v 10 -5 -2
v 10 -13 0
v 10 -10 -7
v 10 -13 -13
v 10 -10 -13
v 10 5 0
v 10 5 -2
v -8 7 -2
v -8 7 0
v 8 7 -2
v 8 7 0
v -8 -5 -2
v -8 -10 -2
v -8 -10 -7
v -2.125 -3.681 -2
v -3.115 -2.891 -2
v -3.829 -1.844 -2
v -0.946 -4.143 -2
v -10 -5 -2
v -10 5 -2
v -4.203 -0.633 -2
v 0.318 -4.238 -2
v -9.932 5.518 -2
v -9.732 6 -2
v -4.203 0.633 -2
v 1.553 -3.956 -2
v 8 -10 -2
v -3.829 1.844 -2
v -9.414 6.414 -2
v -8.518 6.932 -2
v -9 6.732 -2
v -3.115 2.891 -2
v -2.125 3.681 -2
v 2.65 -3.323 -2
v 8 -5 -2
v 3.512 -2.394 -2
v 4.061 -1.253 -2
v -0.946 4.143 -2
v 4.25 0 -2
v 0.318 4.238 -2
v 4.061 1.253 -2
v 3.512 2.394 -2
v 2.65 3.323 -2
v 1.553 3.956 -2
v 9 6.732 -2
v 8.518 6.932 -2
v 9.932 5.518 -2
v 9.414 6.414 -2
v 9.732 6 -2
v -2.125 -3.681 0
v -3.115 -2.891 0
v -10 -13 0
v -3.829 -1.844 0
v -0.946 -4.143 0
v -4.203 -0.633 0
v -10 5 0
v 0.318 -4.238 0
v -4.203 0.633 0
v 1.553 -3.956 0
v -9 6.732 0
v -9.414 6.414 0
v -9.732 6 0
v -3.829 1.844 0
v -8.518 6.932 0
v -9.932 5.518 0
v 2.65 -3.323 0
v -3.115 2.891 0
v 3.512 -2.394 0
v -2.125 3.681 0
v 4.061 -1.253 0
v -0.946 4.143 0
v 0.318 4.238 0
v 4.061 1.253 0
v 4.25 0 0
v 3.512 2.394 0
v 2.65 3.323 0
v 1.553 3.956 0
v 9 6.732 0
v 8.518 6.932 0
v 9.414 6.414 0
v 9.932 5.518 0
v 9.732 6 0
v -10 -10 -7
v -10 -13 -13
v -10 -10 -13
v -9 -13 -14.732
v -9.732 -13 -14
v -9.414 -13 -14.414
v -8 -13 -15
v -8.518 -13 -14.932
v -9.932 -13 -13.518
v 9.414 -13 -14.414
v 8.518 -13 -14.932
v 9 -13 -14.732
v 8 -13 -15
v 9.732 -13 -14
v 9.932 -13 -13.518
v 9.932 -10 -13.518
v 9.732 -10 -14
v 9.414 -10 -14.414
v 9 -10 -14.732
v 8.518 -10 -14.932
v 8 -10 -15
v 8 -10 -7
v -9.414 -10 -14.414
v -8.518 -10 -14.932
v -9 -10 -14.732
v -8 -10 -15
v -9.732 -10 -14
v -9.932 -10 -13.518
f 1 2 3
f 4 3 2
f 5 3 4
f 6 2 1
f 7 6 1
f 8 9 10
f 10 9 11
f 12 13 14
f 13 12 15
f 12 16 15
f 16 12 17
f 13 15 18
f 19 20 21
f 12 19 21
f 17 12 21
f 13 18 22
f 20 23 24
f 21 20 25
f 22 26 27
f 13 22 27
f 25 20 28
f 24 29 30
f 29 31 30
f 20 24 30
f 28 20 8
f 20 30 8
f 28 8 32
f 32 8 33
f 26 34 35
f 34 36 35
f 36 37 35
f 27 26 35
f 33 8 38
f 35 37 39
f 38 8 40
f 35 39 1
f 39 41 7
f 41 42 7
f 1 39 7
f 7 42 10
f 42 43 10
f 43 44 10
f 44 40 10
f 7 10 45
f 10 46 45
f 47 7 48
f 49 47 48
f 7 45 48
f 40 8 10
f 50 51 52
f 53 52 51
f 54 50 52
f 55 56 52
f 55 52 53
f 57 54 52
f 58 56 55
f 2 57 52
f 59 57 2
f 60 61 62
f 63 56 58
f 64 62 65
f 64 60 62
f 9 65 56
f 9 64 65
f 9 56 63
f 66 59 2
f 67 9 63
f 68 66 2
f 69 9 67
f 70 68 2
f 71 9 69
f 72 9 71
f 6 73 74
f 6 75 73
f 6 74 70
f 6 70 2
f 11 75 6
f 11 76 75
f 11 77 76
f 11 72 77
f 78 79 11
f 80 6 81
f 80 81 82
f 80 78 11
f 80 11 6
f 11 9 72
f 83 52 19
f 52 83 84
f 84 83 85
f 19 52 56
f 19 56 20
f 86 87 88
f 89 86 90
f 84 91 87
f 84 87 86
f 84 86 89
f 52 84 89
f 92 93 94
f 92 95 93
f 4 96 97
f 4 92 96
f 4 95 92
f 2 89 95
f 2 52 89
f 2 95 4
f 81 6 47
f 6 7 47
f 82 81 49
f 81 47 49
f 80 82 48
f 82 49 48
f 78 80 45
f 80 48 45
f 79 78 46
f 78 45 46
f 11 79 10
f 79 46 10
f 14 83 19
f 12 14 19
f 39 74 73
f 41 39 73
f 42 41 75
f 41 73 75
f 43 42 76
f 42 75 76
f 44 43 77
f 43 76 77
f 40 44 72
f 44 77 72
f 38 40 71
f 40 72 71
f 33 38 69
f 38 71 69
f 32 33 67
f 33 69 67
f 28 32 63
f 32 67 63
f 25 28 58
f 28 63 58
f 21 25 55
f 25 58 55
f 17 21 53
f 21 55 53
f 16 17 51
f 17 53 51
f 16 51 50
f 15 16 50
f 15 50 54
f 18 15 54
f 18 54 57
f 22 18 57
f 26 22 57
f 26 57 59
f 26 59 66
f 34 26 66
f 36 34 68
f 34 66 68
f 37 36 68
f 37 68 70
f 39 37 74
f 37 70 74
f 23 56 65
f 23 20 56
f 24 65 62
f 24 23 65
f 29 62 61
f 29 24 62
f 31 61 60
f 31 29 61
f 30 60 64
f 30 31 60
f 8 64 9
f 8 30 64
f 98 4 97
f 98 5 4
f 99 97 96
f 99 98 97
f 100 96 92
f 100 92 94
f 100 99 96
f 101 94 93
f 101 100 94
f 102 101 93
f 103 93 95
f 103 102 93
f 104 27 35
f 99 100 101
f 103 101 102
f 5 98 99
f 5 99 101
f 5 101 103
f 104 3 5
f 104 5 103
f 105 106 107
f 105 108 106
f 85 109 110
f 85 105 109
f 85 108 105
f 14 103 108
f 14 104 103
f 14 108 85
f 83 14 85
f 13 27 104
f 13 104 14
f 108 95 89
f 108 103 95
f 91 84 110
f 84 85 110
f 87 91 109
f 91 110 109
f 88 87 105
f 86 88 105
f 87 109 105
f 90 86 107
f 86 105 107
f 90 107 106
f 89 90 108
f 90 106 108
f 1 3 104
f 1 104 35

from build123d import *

# Parameters (mm, degrees)
SKICA1_W                = 20
SKICA1_H                = 20
SKICA1_R                = 4.25
P_IDAT_VYSUNUT_M1_DEPTH = 2
P_IDAT_START            = -2
SKICA2_W                = 20
SKICA2_H                = 3
P_IDAT_VYSUNUT_M2_DEPTH = 15
P_IDAT_VYSUNUT_M3_DEPTH = 2
ZAOBLIT1_R              = 2
ZAOBLIT2_R              = 2


with BuildPart() as part:
    # Skica1 → Přidat vysunutím1 (new body)
    with BuildSketch(Plane.XY):
        with Locations((0, -3)):
            Rectangle(SKICA1_W, SKICA1_H)
        Circle(SKICA1_R, mode=Mode.SUBTRACT)
    extrude(amount=-P_IDAT_VYSUNUT_M1_DEPTH)

    # Skica2 → Přidat vysunutím2 (add)
    with BuildSketch(Plane(origin=(0, 0, -2), x_dir=(-1, 0, 0), z_dir=(0, 0, -1)).offset(P_IDAT_START)):
        with Locations((0, -11.5)):
            Rectangle(SKICA2_W, SKICA2_H)
    extrude(amount=P_IDAT_VYSUNUT_M2_DEPTH)

    # Skica3 → Přidat vysunutím3 (add)
    with BuildSketch(Plane.ZY.offset(10)):
        Polygon((-2, -10), (-7, -10), (-2, -5), align=None)
    p_idat_vysunut_m3 = extrude(amount=-P_IDAT_VYSUNUT_M3_DEPTH)

    # Zrcadlit1: Přidat vysunutím3 across plane
    add(p_idat_vysunut_m3.mirror(Plane(origin=(0, 0, 0), x_dir=(0, 0, 1), z_dir=(1, 0, 0))))

    # Zaoblit1
    zaoblit1_edges = [part.edges().sort_by_distance(p)[0] for p in [
        (-10, 7, -1),
        (10, 7, -1),
    ]]
    fillet(zaoblit1_edges, radius=ZAOBLIT1_R)

    # Zaoblit2
    zaoblit2_edges = [part.edges().sort_by_distance(p)[0] for p in [
        (-10, -11.5, -15),
        (10, -11.5, -15),
    ]]
    fillet(zaoblit2_edges, radius=ZAOBLIT2_R)


solid = part.part
